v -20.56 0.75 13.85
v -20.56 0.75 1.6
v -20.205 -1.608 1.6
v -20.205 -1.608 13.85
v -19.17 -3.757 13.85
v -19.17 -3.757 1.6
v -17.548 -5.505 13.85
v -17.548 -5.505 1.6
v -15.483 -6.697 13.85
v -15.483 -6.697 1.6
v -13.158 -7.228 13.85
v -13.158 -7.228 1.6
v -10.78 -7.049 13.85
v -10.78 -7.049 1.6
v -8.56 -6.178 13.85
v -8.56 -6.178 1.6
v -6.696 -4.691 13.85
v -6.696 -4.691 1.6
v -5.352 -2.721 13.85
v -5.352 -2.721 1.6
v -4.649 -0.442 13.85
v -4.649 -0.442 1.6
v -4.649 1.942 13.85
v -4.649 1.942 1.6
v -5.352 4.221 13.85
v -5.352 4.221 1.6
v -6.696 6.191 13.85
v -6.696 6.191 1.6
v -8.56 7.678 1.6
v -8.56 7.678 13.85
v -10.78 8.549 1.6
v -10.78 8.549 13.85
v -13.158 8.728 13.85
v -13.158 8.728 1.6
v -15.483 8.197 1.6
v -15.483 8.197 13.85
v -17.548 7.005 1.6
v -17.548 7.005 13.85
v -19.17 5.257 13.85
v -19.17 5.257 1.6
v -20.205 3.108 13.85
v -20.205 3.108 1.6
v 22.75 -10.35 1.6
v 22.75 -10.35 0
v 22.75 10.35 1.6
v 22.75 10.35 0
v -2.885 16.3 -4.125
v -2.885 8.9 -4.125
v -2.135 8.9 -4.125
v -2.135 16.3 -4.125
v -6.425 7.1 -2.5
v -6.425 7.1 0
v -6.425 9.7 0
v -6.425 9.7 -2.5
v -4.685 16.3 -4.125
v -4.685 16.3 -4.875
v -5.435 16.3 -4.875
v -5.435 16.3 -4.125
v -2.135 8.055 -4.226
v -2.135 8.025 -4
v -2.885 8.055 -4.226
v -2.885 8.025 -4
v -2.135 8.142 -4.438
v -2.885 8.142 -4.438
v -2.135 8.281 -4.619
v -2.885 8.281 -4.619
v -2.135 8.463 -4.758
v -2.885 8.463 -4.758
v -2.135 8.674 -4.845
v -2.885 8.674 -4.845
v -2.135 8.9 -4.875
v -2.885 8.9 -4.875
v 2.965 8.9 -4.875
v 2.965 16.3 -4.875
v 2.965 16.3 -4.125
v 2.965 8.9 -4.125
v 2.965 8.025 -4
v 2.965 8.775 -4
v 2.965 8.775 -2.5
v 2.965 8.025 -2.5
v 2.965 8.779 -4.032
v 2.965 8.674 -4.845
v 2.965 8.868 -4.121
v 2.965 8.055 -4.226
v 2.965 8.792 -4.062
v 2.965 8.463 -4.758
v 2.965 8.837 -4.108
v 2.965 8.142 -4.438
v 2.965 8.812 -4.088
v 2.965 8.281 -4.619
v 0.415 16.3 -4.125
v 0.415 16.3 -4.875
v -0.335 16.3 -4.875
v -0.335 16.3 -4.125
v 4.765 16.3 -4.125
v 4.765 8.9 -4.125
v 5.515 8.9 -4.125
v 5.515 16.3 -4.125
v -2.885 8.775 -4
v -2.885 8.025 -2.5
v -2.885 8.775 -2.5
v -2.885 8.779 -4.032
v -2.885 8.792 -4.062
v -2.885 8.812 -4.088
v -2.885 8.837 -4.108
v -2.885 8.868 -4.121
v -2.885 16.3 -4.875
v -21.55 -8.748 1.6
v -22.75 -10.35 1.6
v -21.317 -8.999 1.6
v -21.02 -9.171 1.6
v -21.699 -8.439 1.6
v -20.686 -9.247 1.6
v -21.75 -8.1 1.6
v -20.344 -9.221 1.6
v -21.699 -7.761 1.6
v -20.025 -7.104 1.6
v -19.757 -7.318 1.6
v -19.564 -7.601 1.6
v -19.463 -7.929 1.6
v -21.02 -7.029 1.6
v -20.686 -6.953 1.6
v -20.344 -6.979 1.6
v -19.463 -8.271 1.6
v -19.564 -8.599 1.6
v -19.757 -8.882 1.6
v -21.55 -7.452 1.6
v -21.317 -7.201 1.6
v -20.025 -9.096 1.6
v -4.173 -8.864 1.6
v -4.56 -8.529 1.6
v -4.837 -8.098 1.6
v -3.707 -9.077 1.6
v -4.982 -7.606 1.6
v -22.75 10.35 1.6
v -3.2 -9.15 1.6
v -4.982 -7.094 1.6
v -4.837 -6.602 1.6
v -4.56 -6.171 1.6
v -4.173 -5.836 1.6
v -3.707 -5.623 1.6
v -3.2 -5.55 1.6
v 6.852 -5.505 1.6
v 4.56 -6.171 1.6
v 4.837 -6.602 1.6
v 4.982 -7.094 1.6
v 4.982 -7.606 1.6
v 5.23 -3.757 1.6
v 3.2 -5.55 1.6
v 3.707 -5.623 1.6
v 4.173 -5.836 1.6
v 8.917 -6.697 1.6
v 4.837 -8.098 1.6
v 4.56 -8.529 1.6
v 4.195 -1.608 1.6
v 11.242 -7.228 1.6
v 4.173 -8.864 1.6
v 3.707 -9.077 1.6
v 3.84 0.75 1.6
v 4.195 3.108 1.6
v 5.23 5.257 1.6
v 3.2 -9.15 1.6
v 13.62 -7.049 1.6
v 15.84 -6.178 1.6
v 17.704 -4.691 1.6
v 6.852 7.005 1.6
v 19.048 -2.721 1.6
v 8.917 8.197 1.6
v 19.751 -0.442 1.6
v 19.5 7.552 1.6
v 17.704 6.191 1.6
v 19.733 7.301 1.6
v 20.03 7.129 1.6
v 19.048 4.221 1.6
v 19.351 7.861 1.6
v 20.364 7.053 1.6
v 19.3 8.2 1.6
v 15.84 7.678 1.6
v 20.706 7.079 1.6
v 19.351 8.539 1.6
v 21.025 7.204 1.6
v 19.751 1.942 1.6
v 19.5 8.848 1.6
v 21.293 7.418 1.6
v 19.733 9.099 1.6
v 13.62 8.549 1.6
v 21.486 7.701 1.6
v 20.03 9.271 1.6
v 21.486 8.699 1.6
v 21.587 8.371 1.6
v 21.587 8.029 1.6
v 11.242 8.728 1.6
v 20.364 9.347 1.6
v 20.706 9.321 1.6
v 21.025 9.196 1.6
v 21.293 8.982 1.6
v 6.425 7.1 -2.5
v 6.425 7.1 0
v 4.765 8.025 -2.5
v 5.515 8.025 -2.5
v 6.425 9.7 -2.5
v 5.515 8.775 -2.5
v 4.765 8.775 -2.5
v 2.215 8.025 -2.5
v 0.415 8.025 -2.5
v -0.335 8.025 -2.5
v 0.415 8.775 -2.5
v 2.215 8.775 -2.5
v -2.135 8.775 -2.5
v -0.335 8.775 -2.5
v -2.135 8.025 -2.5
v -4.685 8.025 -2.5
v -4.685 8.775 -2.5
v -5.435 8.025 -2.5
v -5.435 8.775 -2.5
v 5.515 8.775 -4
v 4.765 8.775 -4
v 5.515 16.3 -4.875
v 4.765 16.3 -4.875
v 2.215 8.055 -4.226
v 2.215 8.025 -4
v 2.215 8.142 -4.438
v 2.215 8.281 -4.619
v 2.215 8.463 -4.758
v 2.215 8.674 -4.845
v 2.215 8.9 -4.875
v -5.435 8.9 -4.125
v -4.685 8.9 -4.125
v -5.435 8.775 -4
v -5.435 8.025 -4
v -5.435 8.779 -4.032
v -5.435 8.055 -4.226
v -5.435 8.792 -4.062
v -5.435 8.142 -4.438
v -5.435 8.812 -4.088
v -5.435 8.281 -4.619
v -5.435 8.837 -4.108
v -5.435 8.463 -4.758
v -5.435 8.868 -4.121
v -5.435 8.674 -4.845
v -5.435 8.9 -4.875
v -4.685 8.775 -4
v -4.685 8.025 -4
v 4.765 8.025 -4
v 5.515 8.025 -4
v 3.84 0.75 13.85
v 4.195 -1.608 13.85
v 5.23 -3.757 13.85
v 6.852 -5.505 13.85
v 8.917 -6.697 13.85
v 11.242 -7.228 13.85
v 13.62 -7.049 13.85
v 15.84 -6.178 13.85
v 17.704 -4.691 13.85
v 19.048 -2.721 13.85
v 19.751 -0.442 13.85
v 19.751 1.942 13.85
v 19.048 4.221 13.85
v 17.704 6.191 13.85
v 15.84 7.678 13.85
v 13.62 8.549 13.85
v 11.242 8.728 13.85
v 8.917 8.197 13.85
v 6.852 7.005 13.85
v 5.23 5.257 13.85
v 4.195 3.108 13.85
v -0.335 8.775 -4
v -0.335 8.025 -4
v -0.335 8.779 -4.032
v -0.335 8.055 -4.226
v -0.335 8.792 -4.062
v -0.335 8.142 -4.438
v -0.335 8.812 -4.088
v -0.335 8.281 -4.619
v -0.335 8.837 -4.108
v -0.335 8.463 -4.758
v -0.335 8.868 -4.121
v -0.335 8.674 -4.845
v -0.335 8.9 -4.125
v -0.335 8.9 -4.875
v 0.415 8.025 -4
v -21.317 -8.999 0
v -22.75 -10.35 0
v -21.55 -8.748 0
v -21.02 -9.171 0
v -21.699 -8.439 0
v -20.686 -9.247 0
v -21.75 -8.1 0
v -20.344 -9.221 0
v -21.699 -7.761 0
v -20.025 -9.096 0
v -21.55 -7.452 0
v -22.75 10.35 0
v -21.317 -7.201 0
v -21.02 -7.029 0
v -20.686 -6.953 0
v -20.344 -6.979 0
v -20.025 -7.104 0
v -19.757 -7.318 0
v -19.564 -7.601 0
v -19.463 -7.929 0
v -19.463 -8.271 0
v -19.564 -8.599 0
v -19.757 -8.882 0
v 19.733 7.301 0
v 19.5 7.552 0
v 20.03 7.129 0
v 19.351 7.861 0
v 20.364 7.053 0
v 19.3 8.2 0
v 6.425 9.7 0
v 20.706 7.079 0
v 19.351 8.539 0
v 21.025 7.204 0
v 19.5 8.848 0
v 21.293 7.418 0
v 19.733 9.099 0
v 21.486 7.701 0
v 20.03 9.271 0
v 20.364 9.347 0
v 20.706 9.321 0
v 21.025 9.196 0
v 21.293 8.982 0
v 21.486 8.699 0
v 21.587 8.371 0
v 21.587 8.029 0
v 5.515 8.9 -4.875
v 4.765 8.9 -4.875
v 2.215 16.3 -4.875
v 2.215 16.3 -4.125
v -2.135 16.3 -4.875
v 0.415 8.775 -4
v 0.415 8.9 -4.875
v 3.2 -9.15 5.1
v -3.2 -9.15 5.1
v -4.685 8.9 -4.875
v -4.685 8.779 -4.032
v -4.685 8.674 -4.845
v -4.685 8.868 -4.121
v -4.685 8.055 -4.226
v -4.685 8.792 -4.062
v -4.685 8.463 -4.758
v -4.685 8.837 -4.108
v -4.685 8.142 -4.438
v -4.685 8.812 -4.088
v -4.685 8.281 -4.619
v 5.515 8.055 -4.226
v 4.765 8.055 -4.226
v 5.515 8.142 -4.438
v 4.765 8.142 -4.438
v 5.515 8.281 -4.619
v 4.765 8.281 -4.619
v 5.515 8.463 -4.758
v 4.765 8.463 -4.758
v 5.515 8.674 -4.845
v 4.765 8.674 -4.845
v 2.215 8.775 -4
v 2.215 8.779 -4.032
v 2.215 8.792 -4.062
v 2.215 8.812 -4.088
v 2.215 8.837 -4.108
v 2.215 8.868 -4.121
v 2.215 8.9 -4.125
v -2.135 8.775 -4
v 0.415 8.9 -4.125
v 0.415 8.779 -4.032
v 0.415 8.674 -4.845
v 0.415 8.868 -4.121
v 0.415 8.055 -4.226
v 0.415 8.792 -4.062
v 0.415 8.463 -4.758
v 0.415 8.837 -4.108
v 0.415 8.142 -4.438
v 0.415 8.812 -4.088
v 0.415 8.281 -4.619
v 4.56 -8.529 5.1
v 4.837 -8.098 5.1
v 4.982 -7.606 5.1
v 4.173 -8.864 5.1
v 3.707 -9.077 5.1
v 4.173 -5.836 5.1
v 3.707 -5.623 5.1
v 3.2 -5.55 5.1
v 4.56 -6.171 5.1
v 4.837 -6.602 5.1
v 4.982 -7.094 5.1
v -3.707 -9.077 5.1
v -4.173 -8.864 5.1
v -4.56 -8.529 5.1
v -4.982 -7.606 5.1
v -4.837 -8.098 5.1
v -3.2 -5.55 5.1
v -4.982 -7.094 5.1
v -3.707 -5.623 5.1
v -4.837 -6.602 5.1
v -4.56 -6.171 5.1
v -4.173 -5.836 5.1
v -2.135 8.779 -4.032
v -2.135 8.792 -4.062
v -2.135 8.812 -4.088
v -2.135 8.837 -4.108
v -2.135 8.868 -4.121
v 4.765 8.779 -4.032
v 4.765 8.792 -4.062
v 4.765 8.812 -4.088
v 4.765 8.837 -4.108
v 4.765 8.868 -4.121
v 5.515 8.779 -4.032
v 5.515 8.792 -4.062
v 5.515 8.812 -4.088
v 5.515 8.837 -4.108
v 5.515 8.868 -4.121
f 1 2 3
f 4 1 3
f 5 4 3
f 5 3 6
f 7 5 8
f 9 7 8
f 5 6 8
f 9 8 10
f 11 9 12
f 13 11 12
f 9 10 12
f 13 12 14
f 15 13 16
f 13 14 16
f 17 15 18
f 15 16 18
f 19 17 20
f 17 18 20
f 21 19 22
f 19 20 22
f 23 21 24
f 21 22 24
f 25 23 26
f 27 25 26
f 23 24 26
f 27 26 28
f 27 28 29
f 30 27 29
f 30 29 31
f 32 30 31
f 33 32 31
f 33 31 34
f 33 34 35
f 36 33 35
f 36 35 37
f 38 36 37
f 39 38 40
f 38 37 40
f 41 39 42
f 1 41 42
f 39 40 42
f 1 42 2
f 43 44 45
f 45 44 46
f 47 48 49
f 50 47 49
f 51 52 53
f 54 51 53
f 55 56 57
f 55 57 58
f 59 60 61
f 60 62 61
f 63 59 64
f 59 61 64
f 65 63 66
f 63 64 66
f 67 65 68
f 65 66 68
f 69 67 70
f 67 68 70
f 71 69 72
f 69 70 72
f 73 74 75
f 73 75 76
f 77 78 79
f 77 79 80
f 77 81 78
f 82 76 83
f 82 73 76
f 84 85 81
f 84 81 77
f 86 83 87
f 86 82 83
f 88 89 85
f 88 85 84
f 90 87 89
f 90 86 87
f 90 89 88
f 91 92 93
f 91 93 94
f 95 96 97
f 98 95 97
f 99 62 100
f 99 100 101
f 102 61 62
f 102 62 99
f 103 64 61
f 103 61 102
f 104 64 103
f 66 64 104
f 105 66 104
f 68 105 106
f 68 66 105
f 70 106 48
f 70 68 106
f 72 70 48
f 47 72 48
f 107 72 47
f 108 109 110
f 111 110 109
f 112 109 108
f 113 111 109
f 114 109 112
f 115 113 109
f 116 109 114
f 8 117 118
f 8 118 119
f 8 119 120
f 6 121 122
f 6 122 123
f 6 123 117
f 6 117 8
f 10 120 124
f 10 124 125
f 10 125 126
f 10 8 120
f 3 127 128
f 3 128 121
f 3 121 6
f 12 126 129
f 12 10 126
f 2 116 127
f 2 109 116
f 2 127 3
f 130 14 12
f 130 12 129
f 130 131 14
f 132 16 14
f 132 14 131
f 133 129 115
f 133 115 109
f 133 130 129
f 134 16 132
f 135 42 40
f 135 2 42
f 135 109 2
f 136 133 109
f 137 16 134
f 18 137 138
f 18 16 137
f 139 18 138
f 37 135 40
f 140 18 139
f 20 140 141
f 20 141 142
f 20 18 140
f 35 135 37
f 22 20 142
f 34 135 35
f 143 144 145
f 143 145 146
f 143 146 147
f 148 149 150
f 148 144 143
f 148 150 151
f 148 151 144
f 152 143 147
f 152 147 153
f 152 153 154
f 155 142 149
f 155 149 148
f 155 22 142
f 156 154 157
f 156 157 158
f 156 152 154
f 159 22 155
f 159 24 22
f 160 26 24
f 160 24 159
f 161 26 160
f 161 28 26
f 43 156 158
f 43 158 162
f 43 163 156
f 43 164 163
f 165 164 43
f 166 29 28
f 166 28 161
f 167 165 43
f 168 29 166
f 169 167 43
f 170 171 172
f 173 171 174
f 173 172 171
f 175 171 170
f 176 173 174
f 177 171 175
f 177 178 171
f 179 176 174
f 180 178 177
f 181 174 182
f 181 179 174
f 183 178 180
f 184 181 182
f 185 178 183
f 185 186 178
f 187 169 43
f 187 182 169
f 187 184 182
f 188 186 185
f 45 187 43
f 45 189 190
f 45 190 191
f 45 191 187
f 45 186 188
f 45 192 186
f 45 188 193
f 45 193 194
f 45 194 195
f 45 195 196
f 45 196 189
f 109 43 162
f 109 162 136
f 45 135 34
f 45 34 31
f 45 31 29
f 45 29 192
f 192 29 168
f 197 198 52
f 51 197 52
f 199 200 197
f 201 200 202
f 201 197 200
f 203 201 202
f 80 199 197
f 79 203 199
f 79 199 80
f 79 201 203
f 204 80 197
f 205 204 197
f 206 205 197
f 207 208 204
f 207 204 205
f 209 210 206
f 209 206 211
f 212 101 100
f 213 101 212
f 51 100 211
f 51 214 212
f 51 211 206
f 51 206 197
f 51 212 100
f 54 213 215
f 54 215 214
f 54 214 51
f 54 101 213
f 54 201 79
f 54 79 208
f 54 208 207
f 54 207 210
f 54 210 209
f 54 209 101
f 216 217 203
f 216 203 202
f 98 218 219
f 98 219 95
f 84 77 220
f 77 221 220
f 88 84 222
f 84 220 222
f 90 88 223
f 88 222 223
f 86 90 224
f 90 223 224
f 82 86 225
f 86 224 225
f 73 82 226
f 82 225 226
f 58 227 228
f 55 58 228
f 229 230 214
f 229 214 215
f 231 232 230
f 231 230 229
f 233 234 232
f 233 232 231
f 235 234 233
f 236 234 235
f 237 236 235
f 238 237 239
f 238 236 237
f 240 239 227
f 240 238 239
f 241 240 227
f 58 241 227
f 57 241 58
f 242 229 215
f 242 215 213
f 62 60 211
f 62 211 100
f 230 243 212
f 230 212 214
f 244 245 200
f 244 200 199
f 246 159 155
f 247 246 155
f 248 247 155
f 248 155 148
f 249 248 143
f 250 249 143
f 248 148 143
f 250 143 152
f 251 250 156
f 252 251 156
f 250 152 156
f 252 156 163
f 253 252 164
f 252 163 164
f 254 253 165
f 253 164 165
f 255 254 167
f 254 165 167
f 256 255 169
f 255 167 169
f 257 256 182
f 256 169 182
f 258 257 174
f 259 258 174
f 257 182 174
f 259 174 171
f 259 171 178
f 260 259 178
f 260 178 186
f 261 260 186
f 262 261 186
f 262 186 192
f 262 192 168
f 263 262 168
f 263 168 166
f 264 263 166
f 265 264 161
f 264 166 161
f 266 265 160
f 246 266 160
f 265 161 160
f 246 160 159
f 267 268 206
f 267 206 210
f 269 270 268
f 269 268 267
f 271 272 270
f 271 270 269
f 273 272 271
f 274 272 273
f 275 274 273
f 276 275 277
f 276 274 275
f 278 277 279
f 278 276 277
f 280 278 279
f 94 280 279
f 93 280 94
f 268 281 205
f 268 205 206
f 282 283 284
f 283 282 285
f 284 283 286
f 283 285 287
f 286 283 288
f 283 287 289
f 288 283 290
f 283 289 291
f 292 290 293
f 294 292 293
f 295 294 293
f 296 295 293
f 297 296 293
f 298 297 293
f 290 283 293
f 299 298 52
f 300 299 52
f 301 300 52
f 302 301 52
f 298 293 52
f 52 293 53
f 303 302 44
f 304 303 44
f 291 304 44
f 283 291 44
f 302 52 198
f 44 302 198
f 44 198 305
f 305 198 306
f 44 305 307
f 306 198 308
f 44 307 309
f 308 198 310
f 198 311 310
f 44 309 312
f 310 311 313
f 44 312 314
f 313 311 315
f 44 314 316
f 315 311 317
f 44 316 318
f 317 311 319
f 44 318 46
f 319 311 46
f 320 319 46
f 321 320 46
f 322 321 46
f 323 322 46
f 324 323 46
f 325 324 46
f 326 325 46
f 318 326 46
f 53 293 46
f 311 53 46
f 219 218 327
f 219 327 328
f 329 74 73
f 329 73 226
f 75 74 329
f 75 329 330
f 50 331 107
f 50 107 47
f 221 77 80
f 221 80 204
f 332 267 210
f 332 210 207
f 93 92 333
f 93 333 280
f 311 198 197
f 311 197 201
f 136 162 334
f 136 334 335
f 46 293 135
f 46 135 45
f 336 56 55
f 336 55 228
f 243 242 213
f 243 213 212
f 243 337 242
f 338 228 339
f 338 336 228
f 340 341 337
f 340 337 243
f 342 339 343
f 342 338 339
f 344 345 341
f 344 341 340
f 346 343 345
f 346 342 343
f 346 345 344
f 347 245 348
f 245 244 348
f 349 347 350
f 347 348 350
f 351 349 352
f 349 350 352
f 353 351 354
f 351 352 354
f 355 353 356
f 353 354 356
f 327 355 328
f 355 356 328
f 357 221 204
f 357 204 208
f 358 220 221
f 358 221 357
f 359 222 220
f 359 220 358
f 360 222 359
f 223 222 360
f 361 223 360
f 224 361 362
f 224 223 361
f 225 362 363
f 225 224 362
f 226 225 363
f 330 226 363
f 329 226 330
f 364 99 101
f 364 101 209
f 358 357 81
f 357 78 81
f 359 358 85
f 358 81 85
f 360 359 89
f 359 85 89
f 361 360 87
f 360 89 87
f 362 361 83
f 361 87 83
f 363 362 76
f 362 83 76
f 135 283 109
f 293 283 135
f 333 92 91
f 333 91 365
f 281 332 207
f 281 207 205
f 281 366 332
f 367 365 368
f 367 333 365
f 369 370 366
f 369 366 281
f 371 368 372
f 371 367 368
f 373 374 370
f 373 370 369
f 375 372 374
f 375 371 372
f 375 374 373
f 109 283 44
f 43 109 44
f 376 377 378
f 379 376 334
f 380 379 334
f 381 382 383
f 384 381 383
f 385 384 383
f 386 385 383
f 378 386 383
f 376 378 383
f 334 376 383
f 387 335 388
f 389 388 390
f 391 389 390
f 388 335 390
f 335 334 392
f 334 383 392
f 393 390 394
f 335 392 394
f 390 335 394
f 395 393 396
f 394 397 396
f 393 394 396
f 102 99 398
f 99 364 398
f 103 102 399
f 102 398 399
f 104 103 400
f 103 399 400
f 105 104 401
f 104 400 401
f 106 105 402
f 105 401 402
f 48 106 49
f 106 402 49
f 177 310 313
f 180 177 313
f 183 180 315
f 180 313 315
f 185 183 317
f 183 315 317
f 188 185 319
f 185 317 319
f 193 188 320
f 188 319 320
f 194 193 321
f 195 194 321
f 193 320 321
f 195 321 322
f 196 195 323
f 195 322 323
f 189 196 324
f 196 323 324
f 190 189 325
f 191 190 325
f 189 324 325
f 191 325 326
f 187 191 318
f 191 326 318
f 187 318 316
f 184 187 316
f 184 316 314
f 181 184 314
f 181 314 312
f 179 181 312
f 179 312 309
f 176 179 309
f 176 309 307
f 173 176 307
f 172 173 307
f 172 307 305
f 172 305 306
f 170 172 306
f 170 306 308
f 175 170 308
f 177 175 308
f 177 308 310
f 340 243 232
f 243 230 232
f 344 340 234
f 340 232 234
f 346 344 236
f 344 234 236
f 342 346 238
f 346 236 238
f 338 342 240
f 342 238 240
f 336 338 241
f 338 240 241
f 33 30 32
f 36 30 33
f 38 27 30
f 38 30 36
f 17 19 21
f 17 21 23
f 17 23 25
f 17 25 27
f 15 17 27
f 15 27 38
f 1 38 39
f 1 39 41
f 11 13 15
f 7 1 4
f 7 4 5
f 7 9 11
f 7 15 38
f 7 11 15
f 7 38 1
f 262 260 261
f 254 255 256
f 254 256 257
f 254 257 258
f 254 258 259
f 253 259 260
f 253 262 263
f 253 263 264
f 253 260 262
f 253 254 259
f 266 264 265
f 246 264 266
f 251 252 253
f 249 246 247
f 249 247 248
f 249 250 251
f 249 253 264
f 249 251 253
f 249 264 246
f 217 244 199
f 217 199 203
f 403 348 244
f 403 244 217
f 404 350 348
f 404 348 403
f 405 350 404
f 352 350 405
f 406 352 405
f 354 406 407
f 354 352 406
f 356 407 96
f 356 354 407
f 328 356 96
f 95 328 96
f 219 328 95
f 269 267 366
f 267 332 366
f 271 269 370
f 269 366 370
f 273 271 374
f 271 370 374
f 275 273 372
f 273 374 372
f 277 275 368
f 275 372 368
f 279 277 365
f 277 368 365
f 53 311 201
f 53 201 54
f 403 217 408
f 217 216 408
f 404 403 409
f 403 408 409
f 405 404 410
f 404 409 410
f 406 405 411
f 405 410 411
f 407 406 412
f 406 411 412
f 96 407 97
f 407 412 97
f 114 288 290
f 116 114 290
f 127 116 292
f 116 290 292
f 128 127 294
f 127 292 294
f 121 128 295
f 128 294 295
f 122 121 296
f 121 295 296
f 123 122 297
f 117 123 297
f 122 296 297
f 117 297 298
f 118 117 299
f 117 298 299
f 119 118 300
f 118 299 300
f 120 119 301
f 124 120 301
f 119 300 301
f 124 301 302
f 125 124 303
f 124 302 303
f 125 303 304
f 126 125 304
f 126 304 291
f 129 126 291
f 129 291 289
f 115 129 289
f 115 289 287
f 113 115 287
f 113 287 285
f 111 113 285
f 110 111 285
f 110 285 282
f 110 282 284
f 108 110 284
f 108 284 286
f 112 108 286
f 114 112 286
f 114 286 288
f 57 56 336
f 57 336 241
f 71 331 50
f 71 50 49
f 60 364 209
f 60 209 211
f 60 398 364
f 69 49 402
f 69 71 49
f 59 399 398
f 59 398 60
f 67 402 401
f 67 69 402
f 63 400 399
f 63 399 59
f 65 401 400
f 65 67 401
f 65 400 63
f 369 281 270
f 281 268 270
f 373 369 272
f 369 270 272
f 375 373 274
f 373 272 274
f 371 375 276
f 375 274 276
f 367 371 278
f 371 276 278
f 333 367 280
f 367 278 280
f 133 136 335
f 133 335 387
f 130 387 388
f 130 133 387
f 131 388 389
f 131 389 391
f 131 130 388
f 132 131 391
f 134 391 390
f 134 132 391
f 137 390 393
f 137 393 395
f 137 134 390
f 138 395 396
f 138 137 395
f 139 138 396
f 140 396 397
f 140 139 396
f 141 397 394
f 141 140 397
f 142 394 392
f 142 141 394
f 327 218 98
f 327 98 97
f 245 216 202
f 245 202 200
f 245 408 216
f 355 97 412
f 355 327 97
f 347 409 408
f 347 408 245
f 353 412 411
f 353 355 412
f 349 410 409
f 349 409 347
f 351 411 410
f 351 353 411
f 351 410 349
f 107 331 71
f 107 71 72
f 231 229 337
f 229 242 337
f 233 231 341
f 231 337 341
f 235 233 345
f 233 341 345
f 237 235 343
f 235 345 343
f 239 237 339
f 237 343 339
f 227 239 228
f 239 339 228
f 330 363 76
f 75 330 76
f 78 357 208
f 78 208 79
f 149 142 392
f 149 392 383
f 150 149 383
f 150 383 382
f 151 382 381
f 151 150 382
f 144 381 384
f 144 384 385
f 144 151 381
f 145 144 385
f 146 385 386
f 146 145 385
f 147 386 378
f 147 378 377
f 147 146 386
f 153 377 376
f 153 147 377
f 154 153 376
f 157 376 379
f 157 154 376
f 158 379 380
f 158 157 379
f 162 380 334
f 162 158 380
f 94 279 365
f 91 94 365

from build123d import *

# Parameters (mm, degrees)
SKETCH1_W           = 45.5
SKETCH1_H           = 20.7
BOSS_EXTRUDE1_DEPTH = 1.6
SKETCH2_R           = 8
BOSS_EXTRUDE2_DEPTH = 12.25
BOSS_EXTRUDE3_DEPTH = 3.5
SKETCH4_R           = 1.15
CUT_EXTRUDE1_DEPTH  = 3.5
SKETCH5_W           = 12.85
SKETCH5_H           = 2.6
BOSS_EXTRUDE4_DEPTH = 2.5
SKETCH6_W           = 0.75
SKETCH6_H           = 0.75
LPATTERN1_COUNT     = 5
LPATTERN1_PITCH     = 2.55


with BuildPart() as part:
    # Sketch1 → Boss-Extrude1 (new body)
    with BuildSketch(Plane.XY):
        Rectangle(SKETCH1_W, SKETCH1_H)
    extrude(amount=BOSS_EXTRUDE1_DEPTH)

    # Sketch2 → Boss-Extrude2 (add)
    with BuildSketch(Plane.XY.offset(1.6)):
        with Locations(Location((-12.56, 0.75, 0), (0, 0, 180))):
            Circle(SKETCH2_R)
        with Locations(Location((11.84, 0.75, 0), (0, 0, 180))):
            Circle(SKETCH2_R)
    extrude(amount=BOSS_EXTRUDE2_DEPTH)

    # Sketch3 → Boss-Extrude3 (add)
    with BuildSketch(Plane.XY.offset(1.6)):
        with BuildLine():
            Line((-3.2, -5.55), (3.2, -5.55))
            ThreePointArc((3.2, -5.55), (5, -7.35), (3.2, -9.15))
            Line((3.2, -9.15), (-3.2, -9.15))
            ThreePointArc((-3.2, -9.15), (-5, -7.35), (-3.2, -5.55))
        make_face()
    extrude(amount=BOSS_EXTRUDE3_DEPTH)

    # Sketch4 → Cut-Extrude1 (cut)
    with BuildSketch(Plane(origin=(0, 0, 0), x_dir=(-1, 0, 0), z_dir=(0, 0, -1))):
        with Locations((-20.45, 8.2)):
            Circle(SKETCH4_R)
        with Locations((20.6, -8.1)):
            Circle(SKETCH4_R)
    extrude(amount=-CUT_EXTRUDE1_DEPTH, mode=Mode.SUBTRACT)

    # Sketch5 → Boss-Extrude4 (add)
    with BuildSketch(Plane(origin=(0, 0, 0), x_dir=(-1, 0, 0), z_dir=(0, 0, -1))):
        with Locations((0, 8.4)):
            Rectangle(SKETCH5_W, SKETCH5_H)
    extrude(amount=BOSS_EXTRUDE4_DEPTH)

    # Sweep17: sweep along a path in Sketch7
    with BuildLine(Plane(origin=(5.14, 0, 0), x_dir=(0, -1, 0), z_dir=(1, 0, 0))) as sweep17_path:
        Line((-8.4, 2.5), (-8.4, 4))
        ThreePointArc((-8.4, 4), (-8.546446609, 4.353553391), (-8.9, 4.5))
        Line((-8.9, 4.5), (-16.3, 4.5))
    # Sketch6 → Sweep17 (sweep)
    with BuildSketch(Plane(origin=(0, 0, -2.5), x_dir=(-1, 0, 0), z_dir=(0, 0, -1))):
        with Locations((-5.14, 8.4)):
            Rectangle(SKETCH6_W, SKETCH6_H)
    sweep17 = sweep(path=sweep17_path.line)

    # LPattern1: Sweep17 ×5
    with Locations(*[(-i * LPATTERN1_PITCH, 0, 0) for i in range(1, LPATTERN1_COUNT)]):
        add(sweep17)


solid = part.part
